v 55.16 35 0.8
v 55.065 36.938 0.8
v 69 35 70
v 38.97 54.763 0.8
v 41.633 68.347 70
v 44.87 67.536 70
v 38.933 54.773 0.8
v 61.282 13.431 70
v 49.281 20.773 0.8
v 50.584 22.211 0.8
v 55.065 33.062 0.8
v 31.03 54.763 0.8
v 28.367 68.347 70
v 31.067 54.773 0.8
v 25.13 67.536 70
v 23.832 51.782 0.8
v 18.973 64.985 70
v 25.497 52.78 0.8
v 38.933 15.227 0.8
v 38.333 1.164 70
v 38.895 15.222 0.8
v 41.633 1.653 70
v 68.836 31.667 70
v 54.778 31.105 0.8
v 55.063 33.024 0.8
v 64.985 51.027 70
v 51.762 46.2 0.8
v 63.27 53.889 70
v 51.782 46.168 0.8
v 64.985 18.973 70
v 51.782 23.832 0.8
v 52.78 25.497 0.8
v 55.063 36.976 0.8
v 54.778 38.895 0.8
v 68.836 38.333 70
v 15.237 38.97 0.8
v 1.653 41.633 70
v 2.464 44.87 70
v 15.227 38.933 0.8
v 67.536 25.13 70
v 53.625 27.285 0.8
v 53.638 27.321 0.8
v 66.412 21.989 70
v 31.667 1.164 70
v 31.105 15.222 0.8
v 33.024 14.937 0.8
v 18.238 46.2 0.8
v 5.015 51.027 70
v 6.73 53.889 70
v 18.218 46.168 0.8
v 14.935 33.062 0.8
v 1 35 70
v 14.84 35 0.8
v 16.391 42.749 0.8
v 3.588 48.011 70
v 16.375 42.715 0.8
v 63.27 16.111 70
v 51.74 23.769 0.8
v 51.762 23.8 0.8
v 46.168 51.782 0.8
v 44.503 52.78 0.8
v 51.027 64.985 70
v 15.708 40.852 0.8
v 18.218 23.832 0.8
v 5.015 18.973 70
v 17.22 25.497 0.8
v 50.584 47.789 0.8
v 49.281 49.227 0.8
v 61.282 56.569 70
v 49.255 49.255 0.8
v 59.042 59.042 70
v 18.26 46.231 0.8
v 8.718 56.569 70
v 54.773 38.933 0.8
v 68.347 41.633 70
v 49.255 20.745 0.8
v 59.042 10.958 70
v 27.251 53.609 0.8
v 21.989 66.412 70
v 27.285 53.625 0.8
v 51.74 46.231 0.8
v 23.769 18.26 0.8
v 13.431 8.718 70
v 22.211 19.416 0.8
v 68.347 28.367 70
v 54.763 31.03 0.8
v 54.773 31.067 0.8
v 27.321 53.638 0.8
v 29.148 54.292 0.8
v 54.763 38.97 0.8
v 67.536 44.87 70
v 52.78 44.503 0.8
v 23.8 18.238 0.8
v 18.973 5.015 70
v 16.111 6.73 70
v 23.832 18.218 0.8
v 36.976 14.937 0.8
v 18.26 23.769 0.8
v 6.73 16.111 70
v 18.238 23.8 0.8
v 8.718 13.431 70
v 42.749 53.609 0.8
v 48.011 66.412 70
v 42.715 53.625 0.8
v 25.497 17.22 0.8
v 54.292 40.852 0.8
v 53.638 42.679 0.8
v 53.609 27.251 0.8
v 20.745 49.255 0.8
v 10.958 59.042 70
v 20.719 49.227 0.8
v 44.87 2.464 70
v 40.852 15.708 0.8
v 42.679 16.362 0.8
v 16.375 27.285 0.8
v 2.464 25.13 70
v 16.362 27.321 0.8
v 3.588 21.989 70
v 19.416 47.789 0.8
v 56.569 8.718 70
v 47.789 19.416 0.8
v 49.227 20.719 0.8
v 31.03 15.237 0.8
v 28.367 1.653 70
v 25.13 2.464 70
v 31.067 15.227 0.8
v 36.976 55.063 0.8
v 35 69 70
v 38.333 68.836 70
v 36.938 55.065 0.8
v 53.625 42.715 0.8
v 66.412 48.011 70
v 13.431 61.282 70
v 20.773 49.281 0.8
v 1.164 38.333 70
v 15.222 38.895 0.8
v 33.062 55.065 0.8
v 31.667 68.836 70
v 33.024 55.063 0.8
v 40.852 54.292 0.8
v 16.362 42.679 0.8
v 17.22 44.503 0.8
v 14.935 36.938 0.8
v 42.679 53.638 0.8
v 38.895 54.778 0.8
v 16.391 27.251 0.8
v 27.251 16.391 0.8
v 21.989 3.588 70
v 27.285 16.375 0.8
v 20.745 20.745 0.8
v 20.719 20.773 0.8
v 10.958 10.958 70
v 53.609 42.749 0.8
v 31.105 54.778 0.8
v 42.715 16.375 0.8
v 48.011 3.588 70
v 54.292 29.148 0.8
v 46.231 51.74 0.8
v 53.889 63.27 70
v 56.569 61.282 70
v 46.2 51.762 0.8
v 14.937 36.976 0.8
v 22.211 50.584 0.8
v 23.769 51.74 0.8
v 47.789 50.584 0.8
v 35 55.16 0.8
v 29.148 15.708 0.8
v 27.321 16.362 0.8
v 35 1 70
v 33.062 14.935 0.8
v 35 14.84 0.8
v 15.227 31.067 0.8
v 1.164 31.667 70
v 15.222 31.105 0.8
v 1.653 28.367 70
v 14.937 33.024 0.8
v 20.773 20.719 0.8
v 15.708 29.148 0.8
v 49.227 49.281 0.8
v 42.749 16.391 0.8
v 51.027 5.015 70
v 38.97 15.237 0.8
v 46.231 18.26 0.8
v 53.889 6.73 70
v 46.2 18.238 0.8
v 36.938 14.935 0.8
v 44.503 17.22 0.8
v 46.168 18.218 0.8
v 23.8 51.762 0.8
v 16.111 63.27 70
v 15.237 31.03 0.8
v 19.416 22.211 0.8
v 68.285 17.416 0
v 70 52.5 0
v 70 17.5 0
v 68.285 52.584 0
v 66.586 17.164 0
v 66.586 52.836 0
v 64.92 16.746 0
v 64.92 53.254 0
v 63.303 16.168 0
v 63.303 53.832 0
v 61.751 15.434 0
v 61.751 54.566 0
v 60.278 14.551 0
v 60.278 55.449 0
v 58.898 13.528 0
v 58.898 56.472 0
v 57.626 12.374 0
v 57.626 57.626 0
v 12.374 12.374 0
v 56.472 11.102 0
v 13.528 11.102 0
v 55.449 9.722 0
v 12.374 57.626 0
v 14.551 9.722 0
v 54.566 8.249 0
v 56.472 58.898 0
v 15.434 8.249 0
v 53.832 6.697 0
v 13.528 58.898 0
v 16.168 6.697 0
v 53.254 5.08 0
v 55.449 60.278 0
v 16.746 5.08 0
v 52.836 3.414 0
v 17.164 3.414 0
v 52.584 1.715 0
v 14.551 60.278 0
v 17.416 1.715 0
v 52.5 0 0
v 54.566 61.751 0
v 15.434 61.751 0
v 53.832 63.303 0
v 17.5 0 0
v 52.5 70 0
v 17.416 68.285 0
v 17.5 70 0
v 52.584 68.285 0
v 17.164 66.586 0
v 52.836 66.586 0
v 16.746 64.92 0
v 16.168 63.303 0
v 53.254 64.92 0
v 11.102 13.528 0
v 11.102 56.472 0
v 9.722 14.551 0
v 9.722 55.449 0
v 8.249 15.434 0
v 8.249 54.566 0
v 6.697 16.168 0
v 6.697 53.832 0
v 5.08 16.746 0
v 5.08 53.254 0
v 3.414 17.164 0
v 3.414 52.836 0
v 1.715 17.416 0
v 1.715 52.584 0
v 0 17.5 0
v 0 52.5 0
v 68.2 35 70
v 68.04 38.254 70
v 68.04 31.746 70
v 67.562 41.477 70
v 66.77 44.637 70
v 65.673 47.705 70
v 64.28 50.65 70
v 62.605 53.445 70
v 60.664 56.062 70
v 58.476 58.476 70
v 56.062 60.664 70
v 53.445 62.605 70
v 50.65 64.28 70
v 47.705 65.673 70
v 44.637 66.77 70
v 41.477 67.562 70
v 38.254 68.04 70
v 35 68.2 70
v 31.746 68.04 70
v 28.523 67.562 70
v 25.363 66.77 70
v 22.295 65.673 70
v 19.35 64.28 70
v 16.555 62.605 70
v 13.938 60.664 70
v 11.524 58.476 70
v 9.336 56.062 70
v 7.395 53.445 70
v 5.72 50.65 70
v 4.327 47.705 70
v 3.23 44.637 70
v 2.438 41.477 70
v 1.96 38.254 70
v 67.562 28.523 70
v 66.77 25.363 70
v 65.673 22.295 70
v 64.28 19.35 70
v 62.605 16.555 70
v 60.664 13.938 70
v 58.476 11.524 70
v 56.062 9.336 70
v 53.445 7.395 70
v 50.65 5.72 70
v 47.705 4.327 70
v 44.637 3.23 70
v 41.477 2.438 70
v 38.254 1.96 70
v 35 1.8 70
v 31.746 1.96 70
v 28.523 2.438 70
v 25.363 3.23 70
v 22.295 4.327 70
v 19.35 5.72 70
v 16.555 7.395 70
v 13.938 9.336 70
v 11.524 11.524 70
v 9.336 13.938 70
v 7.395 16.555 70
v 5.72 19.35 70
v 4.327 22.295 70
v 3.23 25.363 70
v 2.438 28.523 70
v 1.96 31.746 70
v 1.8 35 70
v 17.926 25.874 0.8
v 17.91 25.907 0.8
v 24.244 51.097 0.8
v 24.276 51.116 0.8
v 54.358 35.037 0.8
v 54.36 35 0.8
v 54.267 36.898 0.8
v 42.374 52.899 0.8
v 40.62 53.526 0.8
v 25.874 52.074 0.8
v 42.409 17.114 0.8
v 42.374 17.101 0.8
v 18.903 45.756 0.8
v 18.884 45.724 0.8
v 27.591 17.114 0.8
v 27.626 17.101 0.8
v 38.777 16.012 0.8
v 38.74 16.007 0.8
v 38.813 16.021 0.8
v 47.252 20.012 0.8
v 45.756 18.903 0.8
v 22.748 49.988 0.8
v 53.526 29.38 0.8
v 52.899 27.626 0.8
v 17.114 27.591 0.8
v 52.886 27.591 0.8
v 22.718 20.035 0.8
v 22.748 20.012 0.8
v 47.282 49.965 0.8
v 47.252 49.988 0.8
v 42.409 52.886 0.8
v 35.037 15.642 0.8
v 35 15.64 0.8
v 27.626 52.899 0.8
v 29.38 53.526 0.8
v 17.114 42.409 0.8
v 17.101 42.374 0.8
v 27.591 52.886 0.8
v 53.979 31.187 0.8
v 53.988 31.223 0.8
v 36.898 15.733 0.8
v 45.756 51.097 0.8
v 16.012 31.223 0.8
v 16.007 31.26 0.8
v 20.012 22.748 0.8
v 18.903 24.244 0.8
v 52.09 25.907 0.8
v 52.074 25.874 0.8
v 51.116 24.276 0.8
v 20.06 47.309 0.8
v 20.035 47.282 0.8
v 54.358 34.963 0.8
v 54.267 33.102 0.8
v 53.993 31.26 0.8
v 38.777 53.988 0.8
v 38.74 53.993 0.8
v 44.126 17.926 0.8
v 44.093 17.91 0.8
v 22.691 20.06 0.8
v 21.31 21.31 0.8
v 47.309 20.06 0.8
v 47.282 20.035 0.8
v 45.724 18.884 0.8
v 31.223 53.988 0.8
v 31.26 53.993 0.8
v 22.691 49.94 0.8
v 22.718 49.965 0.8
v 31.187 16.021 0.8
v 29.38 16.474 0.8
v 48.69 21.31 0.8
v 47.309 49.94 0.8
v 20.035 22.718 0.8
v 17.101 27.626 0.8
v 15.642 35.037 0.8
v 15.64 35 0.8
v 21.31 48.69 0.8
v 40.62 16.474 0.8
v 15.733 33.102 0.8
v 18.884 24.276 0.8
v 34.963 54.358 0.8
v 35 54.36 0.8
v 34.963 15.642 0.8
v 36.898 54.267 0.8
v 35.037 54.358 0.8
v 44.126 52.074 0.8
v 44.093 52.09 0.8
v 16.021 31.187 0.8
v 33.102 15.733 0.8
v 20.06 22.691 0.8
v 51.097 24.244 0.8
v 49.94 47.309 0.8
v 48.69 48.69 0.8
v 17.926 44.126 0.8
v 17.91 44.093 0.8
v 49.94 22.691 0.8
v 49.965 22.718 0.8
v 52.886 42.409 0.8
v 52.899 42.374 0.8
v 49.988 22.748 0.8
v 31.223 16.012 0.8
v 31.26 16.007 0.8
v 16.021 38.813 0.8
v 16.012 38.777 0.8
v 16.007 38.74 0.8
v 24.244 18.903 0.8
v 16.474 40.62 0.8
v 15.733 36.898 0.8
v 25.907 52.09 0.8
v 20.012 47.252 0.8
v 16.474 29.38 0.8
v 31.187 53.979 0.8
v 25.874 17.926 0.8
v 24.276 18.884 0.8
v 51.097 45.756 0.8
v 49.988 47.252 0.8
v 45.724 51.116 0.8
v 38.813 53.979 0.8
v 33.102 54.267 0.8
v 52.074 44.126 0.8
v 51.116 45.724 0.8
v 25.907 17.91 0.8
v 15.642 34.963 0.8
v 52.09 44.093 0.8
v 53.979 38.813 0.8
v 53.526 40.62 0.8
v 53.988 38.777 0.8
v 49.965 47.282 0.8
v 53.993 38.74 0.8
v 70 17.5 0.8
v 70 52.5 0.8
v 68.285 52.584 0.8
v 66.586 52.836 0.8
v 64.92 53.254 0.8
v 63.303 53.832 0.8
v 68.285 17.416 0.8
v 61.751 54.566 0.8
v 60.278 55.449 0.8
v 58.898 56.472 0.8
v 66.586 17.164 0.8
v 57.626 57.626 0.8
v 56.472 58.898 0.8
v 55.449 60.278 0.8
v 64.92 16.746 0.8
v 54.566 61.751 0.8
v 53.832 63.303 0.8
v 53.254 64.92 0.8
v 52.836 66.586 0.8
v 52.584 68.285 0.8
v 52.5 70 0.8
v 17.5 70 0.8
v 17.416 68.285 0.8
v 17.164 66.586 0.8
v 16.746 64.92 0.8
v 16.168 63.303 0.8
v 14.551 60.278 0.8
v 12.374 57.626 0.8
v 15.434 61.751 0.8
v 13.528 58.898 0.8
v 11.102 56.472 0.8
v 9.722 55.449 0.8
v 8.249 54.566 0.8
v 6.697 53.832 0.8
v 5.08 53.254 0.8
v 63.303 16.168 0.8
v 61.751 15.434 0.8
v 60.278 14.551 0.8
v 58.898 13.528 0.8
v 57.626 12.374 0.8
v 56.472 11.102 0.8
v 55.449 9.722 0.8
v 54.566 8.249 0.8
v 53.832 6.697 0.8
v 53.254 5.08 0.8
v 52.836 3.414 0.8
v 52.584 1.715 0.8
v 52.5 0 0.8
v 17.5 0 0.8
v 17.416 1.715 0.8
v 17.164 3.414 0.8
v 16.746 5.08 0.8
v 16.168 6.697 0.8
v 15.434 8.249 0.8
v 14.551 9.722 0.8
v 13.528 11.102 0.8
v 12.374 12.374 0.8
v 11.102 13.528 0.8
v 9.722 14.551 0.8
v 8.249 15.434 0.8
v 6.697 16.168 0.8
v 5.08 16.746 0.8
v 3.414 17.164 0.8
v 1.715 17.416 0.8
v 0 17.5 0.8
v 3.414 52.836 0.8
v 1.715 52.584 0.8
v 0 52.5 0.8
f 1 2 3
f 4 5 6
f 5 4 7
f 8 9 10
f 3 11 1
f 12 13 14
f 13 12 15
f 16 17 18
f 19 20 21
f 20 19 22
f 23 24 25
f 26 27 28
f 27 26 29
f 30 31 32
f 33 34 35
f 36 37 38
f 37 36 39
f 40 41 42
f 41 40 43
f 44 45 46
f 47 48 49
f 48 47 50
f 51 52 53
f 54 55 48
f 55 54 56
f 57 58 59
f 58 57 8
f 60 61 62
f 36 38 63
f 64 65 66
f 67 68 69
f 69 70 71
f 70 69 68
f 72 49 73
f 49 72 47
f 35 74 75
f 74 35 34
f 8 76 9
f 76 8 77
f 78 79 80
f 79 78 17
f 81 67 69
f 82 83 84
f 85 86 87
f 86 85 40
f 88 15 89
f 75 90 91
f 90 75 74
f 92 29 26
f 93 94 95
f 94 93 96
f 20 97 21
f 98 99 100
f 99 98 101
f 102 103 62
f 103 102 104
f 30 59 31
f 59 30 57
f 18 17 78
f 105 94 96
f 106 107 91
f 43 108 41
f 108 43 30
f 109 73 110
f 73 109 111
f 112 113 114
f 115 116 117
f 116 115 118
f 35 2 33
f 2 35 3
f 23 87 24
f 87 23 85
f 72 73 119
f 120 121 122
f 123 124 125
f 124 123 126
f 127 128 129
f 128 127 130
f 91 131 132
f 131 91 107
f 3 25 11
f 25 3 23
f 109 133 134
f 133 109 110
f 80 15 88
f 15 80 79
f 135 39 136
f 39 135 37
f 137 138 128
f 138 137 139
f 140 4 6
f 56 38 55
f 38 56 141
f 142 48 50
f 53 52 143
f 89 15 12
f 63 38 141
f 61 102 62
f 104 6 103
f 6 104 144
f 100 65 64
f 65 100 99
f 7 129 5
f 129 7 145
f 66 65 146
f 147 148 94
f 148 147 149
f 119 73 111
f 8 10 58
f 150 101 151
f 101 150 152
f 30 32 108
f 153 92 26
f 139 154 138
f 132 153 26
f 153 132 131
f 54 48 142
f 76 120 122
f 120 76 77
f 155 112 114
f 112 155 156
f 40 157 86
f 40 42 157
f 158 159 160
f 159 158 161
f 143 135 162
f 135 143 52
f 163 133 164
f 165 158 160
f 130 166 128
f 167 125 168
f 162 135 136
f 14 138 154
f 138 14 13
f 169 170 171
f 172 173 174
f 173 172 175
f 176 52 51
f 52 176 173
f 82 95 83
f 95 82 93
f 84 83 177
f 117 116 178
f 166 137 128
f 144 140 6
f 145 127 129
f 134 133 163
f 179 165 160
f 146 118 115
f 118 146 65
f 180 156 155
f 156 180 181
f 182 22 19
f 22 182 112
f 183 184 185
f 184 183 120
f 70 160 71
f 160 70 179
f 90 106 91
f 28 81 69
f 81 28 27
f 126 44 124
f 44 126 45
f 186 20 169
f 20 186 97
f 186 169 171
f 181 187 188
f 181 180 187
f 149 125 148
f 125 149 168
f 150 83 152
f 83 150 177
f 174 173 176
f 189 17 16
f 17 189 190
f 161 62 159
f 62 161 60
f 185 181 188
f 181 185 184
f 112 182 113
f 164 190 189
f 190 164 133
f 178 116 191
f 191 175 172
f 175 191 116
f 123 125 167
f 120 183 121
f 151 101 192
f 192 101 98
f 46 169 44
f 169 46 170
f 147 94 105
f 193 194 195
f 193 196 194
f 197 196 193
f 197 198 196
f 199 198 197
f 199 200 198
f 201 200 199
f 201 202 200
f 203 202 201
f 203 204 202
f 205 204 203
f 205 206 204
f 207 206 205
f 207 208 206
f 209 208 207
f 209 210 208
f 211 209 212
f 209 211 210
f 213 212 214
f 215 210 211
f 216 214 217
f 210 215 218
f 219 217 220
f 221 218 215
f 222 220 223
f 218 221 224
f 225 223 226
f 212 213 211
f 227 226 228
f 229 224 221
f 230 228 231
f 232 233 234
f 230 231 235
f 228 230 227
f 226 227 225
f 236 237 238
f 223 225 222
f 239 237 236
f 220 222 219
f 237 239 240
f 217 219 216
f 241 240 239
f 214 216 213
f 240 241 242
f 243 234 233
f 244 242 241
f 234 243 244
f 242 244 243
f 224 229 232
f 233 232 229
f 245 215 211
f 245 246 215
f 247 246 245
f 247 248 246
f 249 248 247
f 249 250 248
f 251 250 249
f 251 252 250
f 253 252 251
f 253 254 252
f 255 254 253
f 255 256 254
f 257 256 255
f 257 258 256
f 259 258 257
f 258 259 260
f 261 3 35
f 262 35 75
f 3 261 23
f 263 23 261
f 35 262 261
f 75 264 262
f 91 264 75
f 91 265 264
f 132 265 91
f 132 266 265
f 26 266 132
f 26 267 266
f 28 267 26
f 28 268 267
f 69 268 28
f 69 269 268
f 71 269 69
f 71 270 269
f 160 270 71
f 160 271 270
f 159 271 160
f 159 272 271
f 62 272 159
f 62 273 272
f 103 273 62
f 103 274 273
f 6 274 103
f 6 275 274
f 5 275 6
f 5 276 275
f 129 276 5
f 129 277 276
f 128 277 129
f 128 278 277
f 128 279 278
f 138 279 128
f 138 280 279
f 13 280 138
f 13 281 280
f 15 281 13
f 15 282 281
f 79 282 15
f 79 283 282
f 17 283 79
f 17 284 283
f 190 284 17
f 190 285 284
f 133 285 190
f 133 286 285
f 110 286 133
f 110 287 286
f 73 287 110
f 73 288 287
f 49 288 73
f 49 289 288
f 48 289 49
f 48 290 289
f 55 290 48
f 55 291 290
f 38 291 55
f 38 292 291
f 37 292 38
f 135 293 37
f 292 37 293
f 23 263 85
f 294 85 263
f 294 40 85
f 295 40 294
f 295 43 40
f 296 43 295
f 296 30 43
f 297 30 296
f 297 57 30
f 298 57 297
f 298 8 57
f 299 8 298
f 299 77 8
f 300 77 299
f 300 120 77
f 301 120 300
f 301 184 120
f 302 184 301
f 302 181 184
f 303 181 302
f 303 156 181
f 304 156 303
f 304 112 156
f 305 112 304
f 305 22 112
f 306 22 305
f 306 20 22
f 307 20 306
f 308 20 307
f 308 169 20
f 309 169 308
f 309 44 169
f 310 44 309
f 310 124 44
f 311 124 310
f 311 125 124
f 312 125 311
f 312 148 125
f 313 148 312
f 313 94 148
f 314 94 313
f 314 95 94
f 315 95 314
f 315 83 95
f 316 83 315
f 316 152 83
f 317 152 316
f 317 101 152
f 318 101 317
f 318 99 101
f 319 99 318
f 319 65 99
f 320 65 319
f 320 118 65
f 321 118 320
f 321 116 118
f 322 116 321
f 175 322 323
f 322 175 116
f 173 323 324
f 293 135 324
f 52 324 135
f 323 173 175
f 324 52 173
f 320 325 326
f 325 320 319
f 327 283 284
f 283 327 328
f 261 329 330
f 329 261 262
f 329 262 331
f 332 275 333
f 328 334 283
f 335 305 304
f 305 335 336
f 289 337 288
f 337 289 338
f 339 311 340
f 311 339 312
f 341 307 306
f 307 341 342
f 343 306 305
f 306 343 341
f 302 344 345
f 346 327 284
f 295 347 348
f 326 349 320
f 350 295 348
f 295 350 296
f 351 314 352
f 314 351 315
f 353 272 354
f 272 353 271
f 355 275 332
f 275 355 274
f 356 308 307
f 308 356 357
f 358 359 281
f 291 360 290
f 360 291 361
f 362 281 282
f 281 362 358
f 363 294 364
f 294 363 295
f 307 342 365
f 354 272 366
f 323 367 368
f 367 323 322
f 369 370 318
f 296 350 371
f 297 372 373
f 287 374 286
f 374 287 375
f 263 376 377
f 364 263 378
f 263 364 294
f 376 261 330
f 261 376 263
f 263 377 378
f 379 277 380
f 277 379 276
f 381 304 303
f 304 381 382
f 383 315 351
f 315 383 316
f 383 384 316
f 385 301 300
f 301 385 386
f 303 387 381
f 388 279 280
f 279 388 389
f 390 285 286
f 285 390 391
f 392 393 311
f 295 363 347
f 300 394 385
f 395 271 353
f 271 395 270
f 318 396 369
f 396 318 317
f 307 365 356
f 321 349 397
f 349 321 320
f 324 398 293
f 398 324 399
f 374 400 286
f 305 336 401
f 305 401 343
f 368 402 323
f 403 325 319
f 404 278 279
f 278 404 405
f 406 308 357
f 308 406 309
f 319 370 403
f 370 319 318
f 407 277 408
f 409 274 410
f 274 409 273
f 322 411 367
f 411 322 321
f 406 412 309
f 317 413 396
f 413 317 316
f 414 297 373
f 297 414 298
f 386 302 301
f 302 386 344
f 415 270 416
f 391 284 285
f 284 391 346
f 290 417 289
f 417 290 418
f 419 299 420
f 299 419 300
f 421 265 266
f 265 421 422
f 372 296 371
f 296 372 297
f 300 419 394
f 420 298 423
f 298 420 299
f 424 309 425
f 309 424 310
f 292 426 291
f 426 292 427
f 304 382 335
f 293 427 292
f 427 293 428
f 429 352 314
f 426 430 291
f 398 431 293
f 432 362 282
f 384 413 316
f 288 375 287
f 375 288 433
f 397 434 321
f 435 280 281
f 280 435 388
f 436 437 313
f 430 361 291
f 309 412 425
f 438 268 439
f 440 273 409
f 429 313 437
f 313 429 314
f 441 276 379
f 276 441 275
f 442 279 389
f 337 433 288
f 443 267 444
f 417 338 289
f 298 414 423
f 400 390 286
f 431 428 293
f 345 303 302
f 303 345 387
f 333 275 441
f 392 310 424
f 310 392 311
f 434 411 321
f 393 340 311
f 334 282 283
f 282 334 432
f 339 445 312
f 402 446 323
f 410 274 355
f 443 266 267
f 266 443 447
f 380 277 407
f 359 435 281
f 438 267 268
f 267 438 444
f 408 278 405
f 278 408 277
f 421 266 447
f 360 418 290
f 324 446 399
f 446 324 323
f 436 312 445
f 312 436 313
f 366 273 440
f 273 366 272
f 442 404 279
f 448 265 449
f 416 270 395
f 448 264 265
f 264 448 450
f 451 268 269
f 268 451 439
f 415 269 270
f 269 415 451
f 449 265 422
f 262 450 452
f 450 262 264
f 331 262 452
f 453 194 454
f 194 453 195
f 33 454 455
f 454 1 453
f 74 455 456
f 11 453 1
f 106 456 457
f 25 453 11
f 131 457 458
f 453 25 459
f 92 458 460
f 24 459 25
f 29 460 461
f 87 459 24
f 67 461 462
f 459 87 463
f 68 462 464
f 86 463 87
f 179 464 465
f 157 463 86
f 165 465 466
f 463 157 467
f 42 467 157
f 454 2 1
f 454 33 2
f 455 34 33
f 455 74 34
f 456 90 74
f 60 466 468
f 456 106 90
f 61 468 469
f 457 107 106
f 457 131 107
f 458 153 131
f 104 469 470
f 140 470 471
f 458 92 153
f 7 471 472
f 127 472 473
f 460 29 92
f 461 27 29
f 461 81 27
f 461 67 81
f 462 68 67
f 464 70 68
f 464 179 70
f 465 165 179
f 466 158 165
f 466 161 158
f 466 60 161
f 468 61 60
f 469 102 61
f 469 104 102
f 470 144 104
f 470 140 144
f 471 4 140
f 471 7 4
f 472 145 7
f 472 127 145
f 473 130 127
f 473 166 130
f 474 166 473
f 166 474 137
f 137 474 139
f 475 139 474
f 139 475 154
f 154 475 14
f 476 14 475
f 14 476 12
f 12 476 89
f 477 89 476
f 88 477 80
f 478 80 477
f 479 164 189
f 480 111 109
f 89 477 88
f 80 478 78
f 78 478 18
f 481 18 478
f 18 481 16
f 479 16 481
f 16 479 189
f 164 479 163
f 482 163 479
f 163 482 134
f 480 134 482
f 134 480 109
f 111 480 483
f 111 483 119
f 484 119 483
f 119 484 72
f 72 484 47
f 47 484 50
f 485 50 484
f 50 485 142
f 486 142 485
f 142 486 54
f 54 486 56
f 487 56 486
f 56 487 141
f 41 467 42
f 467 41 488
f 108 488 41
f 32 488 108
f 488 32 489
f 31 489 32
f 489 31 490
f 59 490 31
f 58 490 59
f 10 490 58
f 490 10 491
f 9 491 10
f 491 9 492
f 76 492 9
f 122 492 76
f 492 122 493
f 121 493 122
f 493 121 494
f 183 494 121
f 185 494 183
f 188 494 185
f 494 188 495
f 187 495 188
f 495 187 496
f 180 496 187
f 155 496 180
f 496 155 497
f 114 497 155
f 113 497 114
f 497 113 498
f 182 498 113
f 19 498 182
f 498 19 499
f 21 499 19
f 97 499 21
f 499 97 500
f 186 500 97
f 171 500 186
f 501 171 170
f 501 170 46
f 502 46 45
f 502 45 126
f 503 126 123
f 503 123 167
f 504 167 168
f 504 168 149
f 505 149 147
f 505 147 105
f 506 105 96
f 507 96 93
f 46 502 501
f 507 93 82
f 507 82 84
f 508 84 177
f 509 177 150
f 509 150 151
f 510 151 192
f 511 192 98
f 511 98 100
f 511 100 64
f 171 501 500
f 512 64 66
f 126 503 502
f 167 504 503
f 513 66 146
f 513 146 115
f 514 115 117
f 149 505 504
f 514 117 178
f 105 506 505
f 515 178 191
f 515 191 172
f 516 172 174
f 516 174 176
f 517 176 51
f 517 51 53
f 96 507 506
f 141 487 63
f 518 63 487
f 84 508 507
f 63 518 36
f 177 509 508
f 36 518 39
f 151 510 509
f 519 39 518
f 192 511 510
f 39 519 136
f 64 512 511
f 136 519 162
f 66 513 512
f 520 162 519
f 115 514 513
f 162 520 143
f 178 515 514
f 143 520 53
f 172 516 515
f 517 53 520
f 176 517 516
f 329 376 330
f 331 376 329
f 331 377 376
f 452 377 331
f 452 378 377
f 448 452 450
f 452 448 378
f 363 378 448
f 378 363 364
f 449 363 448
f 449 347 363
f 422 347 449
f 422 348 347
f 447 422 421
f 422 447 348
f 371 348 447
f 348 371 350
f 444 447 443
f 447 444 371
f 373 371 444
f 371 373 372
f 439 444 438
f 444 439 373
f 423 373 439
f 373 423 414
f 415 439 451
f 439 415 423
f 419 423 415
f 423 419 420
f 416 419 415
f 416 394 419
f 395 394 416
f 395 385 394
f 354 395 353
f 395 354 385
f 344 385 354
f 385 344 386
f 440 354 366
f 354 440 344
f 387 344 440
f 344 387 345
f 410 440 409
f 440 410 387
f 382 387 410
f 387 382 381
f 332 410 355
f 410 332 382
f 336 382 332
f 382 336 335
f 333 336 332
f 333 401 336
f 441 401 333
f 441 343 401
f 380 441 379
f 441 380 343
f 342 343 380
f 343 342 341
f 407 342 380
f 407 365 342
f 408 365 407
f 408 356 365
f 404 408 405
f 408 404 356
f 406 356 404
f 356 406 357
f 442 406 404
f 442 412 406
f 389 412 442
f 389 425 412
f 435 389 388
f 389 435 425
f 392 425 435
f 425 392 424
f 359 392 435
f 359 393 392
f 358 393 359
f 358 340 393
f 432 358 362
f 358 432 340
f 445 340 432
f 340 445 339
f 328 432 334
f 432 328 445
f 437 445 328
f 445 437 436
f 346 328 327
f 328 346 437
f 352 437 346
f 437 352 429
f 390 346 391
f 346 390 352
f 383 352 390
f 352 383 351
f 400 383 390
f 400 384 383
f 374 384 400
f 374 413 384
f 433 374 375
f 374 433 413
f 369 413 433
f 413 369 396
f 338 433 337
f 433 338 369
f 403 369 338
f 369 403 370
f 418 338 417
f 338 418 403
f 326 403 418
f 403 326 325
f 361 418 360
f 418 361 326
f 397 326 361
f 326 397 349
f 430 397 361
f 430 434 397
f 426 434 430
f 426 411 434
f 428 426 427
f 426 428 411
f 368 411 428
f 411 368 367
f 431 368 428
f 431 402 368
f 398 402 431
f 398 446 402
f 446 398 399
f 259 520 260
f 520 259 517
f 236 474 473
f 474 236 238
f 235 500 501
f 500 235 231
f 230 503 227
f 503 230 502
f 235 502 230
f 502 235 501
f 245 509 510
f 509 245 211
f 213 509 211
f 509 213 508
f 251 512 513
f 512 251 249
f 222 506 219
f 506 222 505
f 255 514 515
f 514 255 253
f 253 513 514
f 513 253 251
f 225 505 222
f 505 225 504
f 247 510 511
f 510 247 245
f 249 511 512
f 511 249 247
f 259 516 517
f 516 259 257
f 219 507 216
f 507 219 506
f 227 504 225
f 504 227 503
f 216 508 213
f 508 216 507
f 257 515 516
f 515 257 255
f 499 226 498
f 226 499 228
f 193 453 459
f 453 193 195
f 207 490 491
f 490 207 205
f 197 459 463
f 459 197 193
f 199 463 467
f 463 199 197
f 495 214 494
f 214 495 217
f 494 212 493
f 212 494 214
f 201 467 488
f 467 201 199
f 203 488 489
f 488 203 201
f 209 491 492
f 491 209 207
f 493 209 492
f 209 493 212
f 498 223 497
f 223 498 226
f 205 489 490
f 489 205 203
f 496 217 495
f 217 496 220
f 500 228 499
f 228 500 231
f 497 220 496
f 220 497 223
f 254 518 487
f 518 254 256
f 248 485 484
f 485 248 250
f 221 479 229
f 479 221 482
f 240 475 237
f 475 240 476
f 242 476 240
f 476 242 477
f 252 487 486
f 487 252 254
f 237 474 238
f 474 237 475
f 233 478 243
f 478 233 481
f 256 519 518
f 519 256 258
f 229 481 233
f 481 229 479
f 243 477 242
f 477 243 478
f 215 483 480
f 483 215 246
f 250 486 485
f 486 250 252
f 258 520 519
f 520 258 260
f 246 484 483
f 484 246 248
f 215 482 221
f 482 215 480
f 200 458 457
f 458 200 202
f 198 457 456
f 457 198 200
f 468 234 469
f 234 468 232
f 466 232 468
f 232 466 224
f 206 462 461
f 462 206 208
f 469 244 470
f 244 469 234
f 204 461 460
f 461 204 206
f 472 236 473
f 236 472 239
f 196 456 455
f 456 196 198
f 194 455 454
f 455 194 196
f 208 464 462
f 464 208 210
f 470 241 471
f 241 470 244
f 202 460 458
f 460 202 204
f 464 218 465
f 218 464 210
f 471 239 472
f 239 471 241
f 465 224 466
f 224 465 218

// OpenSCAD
$fn = 64;
$fs = 0.5;

nx = 1;
ny = 1;
dxy_kongs = 70; // lateral spacing between kongs

l = nx*dxy_kongs; // overall length (long dimension)
w = ny*dxy_kongs; // overall width (short dimension)

t_cone = 70; // height of support cone
d_lower = 40; // bottom layer diameter
d_upper = 68; // top layer diameter
t_wall = 0.8; // support cone wall thickness

// Base/grid
t_base = 0.8; // thickness of each layer

for (dx = [1:nx]) {
    for (dy = [1:ny]) {
            translate([(dx-0.5)*dxy_kongs, (dy-0.5)*dxy_kongs, 0]) {
                // Cone
                difference() {
                    cylinder(h = t_cone, d1 = d_lower, d2 = d_upper);
                    cylinder(h = t_cone, d1 = d_lower - 2*t_wall, d2 = d_upper - 2*t_wall);
                }
                
                // Base with grid support
                translate([-dxy_kongs/2, -dxy_kongs/2, 0])
                difference() {
                    cube([dxy_kongs, dxy_kongs, t_base]);
                    cylinder(h = t_base, d = dxy_kongs/2);
                    translate([dxy_kongs, 0, 0])
                        cylinder(h = t_base, d = dxy_kongs/2);
                    translate([0, dxy_kongs, 0])
                        cylinder(h = t_base, d = dxy_kongs/2);
                    translate([dxy_kongs, dxy_kongs, 0])
                        cylinder(h = t_base, d = dxy_kongs/2);
                }
        }
    }
}
